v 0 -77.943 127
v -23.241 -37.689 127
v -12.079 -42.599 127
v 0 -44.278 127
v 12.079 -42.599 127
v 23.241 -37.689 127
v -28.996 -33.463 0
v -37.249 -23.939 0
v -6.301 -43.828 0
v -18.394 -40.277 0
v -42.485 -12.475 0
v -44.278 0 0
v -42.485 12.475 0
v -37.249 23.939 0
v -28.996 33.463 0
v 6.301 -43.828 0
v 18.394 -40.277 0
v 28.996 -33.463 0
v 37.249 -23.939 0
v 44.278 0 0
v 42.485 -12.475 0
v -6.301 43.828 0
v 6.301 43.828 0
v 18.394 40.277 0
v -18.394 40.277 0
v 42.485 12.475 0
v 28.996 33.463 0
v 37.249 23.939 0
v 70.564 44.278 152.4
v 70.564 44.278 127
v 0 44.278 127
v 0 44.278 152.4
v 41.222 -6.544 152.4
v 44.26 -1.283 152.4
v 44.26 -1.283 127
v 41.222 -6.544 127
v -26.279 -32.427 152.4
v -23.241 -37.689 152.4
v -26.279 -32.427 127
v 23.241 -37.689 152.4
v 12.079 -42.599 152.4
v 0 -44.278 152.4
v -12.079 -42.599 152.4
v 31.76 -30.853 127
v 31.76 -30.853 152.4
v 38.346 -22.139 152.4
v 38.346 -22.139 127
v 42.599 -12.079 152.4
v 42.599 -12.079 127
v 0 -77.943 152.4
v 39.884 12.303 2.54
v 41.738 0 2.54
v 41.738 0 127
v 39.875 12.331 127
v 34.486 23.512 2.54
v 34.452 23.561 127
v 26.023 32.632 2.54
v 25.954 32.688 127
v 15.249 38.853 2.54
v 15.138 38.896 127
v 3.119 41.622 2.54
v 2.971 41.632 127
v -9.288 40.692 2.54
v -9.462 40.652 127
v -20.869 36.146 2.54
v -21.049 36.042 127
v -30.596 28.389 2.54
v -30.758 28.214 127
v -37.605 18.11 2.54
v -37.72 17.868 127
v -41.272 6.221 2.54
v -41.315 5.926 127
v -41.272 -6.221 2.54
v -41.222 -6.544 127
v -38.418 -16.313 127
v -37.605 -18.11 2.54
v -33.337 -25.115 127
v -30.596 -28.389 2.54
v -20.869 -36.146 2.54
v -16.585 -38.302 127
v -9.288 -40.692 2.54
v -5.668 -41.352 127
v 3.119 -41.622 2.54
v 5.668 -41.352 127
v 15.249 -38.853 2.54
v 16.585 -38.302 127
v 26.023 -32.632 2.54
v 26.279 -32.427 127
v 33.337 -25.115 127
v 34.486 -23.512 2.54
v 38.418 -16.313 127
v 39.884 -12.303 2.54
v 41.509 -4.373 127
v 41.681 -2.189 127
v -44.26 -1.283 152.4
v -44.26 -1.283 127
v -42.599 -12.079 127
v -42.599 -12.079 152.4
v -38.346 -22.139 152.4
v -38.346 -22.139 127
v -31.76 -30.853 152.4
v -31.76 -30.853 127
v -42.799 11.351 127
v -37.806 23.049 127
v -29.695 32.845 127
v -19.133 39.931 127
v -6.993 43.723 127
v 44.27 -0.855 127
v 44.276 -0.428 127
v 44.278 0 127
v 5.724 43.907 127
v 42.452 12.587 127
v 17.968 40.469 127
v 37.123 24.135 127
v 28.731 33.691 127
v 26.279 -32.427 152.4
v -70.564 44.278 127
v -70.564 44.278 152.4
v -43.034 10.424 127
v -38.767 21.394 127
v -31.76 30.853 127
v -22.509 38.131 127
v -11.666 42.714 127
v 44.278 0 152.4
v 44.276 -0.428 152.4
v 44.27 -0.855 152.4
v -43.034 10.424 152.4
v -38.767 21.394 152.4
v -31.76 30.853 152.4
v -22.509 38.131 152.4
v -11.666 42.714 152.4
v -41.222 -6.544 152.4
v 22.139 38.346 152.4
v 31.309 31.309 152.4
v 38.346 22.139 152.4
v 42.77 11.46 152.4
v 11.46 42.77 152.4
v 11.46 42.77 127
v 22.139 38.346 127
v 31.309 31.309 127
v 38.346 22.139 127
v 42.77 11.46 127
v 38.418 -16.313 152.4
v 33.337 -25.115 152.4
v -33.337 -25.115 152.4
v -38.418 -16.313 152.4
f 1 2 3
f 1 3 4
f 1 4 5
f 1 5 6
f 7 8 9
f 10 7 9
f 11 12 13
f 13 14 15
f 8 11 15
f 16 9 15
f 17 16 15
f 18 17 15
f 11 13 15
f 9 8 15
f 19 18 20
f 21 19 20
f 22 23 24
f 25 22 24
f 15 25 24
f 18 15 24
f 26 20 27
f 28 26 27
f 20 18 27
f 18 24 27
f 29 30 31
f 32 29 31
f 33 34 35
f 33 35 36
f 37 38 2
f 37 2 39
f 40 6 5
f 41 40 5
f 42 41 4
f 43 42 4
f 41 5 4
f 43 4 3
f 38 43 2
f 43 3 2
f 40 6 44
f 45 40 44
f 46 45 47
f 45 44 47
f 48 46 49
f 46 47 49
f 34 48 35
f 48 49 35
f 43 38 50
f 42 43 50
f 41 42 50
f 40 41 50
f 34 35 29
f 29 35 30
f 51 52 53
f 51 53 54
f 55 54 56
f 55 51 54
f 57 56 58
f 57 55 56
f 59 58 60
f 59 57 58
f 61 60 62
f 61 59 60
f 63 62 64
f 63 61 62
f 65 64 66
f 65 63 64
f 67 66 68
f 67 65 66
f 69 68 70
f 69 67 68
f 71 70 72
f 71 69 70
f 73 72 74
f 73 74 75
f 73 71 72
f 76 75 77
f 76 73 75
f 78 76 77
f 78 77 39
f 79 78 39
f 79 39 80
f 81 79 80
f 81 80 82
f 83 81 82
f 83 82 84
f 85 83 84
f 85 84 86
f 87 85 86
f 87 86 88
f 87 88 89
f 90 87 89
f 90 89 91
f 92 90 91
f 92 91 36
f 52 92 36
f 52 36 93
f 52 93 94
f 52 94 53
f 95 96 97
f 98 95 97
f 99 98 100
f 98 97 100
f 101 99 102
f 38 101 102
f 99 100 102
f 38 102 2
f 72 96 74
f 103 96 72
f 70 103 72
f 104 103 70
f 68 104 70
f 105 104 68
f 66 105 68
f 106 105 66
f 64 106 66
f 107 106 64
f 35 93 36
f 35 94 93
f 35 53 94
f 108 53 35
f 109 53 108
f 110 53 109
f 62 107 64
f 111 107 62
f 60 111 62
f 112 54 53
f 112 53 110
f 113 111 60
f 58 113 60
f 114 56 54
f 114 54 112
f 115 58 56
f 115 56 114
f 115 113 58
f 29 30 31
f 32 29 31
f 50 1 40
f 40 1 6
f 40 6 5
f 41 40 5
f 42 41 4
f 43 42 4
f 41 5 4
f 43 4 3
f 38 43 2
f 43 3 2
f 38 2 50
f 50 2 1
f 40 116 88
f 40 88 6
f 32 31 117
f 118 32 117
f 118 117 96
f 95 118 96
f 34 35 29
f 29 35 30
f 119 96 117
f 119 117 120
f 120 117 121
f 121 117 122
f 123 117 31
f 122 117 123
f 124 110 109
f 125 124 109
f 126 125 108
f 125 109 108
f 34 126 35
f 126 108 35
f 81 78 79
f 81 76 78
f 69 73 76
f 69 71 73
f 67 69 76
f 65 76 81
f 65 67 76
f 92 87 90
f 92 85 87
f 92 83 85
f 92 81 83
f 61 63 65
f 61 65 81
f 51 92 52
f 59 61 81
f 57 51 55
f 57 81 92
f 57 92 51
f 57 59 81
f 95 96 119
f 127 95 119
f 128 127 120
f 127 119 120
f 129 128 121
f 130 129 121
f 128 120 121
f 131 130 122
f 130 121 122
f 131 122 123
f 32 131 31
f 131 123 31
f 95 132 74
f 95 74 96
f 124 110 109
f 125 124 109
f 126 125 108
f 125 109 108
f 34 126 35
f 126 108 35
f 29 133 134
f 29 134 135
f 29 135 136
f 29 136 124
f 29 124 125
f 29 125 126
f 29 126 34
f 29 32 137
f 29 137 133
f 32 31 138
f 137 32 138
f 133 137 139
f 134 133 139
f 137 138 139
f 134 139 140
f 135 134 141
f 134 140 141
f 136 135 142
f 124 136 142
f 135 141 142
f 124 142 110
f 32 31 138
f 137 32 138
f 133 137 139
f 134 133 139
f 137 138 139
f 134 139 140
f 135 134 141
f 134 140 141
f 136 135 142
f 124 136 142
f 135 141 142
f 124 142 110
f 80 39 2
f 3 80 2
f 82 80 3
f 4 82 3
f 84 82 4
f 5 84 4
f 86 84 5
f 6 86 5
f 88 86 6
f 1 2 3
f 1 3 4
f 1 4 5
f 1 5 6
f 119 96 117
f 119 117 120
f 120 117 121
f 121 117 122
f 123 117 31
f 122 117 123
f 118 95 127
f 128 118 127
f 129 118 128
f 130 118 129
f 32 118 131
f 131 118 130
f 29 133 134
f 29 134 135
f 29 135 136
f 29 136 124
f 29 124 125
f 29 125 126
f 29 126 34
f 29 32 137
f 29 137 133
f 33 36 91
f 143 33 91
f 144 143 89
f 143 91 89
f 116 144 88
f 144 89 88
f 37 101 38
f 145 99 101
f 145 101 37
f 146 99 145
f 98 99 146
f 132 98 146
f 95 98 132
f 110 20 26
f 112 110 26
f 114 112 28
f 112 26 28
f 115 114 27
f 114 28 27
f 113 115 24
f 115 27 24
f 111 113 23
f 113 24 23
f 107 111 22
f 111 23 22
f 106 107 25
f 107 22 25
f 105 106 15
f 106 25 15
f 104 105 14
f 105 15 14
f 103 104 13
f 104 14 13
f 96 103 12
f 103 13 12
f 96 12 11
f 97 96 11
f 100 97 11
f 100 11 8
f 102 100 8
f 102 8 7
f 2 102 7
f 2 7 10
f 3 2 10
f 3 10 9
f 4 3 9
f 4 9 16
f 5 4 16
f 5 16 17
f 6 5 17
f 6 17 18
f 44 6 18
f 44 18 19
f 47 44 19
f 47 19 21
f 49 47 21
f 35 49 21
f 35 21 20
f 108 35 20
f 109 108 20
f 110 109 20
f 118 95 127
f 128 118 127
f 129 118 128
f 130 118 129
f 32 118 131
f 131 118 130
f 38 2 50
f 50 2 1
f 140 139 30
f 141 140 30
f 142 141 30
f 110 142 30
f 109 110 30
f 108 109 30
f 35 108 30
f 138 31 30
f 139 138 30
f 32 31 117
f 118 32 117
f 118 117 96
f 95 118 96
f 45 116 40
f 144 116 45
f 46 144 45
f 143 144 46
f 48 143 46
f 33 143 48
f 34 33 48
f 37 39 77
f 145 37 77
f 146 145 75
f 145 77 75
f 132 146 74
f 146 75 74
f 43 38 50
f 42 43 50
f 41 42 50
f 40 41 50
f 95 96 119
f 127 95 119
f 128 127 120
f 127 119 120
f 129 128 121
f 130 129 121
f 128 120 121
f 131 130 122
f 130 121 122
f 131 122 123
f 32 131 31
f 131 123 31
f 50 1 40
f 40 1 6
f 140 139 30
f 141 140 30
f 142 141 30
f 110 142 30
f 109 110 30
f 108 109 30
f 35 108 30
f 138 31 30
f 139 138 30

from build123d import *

# Parameters (mm, degrees)
F0_R     = 44.2783110884
F1_DEPTH = 127
F2_T     = -2.54
F4_DEPTH = 25.4
F5_DEPTH = 25.4


# Not quite as in the source:
# - after a boolean that leaves OpenCascade's solid faulty, fix() repairs it


with BuildPart() as f1:
    # F0 (on Top) → F1 (new body)
    with BuildSketch(Plane.XY):
        Circle(F0_R)
    extrude(amount=F1_DEPTH)

    # F2
    f2_openings = [f1.faces().sort_by_distance(p)[0] for p in [
        (0, 0, 127),
    ]]
    offset(amount=F2_T, openings=f2_openings)

    # F3 (on face) → F4, piece 4 (join)
    with BuildSketch(Plane.XY.offset(127)):
        with BuildLine():
            Line((-41.2220744903, -6.5442484079), (-44.2597224544, -1.2828877987))
            ThreePointArc((-44.2597224543, -1.2828877987), (-38.3461422392, -22.1391555442), (-23.2408746511, -37.6886001106))
            Line((-23.2408746511, -37.6886001106), (-26.2785226151, -32.4272395014))
            ThreePointArc((-26.2785226151, -32.4272395014), (-36.1464377136, -20.8691555442), (-41.2220744903, -6.5442484079))
        make_face()
        with BuildLine():
            ThreePointArc((23.2408746511, -37.6886001106), (38.3461422392, -22.1391555442), (44.2597224543, -1.2828877987))
            Line((44.2597224544, -1.2828877987), (41.2220744903, -6.5442484079))
            ThreePointArc((41.2220744903, -6.5442484079), (36.1464377136, -20.8691555442), (26.2785226151, -32.4272395014))
            Line((26.2785226151, -32.4272395014), (23.2408746511, -37.6886001106))
        make_face()
    extrude(amount=F4_DEPTH)

    add(f1.part.fix(), mode=Mode.REPLACE)


with BuildPart() as f4:
    # F3 (on face) → F4 (new body)
    with BuildSketch(Plane.XY.offset(127)):
        with BuildLine():
            Line((-1.56e-08, 44.2783110884), (-70.5644928964, 44.2783110884))
            Line((-70.5644928964, 44.2783110884), (-44.2597224544, -1.2828877987))
            ThreePointArc((-44.2597224543, -1.2828877987), (-31.7598247679, 30.8525908726), (-1.56e-08, 44.2783110884))
        make_face()
    extrude(amount=F4_DEPTH)


with BuildPart() as f4b:
    # F3 (on face) → F4, piece 2 (new body)
    with BuildSketch(Plane.XY.offset(127)):
        with BuildLine():
            Line((70.5644928964, 44.2783110884), (-1.56e-08, 44.2783110884))
            ThreePointArc((-1.56e-08, 44.2783110884), (31.3094940246, 31.3094940356), (44.2783110884, 0))
            ThreePointArc((44.2783110884, 0), (44.273663686, -0.6415112317), (44.2597224543, -1.2828877987))
            Line((44.2597224544, -1.2828877987), (70.5644928964, 44.2783110884))
        make_face()
    extrude(amount=F4_DEPTH)


with BuildPart() as f4c:
    # F3 (on face) → F4, piece 3 (new body)
    with BuildSketch(Plane.XY.offset(127)):
        with BuildLine():
            ThreePointArc((23.2408746511, -37.6886001106), (0, -44.2783110884), (-23.2408746511, -37.6886001106))
            Line((-23.2408746511, -37.6886001106), (0, -77.9429758185))
            Line((0, -77.9429758185), (23.2408746511, -37.6886001106))
        make_face()
    extrude(amount=F4_DEPTH)


with BuildPart() as f5:
    # F3 (on face) → F5 (new body)
    with BuildSketch(Plane.XY.offset(127)):
        with BuildLine():
            Line((70.5644928964, 44.2783110884), (-1.56e-08, 44.2783110884))
            ThreePointArc((-1.56e-08, 44.2783110884), (31.3094940246, 31.3094940356), (44.2783110884, 0))
            ThreePointArc((44.2783110884, 0), (44.273663686, -0.6415112317), (44.2597224543, -1.2828877987))
            Line((44.2597224544, -1.2828877987), (70.5644928964, 44.2783110884))
        make_face()
    extrude(amount=F5_DEPTH)


with BuildPart() as f5b:
    # F3 (on face) → F5, piece 2 (new body)
    with BuildSketch(Plane.XY.offset(127)):
        with BuildLine():
            Line((-1.56e-08, 44.2783110884), (-70.5644928964, 44.2783110884))
            Line((-70.5644928964, 44.2783110884), (-44.2597224544, -1.2828877987))
            ThreePointArc((-44.2597224543, -1.2828877987), (-31.7598247679, 30.8525908726), (-1.56e-08, 44.2783110884))
        make_face()
    extrude(amount=F5_DEPTH)


with BuildPart() as f5c:
    # F3 (on face) → F5, piece 3 (new body)
    with BuildSketch(Plane.XY.offset(127)):
        with BuildLine():
            ThreePointArc((23.2408746511, -37.6886001106), (0, -44.2783110884), (-23.2408746511, -37.6886001106))
            Line((-23.2408746511, -37.6886001106), (0, -77.9429758185))
            Line((0, -77.9429758185), (23.2408746511, -37.6886001106))
        make_face()
    extrude(amount=F5_DEPTH)


solid = Compound([f1.part, f4.part, f4b.part, f4c.part, f5.part, f5b.part, f5c.part])
